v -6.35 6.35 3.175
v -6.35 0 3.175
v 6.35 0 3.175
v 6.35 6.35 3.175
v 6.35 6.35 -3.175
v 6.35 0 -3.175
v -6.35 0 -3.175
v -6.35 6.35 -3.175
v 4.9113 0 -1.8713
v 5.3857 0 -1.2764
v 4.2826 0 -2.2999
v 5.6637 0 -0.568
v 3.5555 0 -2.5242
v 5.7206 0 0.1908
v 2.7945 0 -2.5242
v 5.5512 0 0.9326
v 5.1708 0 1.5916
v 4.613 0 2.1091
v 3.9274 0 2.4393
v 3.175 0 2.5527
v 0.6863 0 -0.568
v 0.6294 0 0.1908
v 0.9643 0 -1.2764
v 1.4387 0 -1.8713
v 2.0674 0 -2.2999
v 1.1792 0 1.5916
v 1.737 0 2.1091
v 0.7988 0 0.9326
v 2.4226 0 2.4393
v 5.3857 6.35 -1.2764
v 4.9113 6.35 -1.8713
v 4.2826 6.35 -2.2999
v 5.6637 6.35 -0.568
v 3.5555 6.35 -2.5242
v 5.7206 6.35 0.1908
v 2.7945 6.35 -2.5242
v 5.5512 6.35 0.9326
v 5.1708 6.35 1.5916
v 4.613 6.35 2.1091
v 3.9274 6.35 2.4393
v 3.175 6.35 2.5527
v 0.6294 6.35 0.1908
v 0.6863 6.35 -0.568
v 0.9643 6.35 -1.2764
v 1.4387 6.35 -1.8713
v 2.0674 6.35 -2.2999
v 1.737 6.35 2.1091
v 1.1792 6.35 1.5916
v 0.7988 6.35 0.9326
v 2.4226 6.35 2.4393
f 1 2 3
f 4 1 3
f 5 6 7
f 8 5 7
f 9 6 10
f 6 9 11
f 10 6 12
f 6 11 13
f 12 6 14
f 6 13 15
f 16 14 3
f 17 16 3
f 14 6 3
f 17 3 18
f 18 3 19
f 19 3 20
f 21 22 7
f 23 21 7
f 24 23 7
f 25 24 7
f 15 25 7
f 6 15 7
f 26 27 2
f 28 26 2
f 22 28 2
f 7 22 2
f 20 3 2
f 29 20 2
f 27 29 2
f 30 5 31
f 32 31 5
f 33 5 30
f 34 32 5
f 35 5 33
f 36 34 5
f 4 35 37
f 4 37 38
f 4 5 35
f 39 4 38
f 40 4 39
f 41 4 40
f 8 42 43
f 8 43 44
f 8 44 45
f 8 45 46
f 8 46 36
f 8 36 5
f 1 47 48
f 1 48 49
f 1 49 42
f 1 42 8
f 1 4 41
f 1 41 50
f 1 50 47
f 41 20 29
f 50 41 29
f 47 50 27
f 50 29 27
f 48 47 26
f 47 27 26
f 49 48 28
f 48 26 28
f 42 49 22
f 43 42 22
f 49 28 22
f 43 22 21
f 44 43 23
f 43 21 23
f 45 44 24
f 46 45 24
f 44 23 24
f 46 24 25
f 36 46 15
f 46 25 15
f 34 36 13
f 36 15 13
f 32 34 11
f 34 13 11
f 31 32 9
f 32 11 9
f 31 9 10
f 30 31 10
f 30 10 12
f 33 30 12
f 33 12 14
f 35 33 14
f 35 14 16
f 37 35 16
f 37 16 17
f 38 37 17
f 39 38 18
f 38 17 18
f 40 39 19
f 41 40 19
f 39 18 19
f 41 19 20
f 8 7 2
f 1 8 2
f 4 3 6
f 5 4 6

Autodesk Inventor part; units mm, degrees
ref_plane "YZ Plane" through (0, 0, 0) normal (1, 0, 0) x (0, 1, 0)
ref_plane "XZ Plane" through (0, 0, 0) normal (0, 1, 0) x (-1, 0, 0)
ref_plane "XY Plane" through (0, 0, 0) normal (0, 0, 1) x (1, 0, 0)
sketch "Sketch1" plane through (0, 0, 0) normal (0, 1, 0) x (-1, 0, 0)
  line L0 (-6.35, -3.175) -> (6.35, -3.175)
  line L1 (6.35, -3.175) -> (6.35, 3.175)
  line L2 (6.35, 3.175) -> (-6.35, 3.175)
  line L3 (-6.35, 3.175) -> (-6.35, -3.175)
  line L4 (-6.35, -3.175) -> (6.35, 3.175) construction
  line L5 (6.35, -3.175) -> (-6.35, 3.175) construction
  point P0 (0, 0)
  dimension "d0" = 12.7
  dimension "d1" = 6.35
extrude "Extrusion1" add sketch "Sketch1" along normal blind 6.35
sketch "Sketch2" plane through (0, 6.35, 0) normal (0, 1, 0) x (1, 0, 0)
  line L0 (0, 0) -> (3.175, 0)
  dimension "d4" = 3.175
hole "Hole1" at (3.175, 6.35, 0) direction (0, -1, 0) diameter 5.1054 end up to surface clearance for "Flat Head Machine Screw (82)" size "#10" standard "Ansi Unified Screw Threads"
properties part number "sheild stop" material "Aluminum 6061"
